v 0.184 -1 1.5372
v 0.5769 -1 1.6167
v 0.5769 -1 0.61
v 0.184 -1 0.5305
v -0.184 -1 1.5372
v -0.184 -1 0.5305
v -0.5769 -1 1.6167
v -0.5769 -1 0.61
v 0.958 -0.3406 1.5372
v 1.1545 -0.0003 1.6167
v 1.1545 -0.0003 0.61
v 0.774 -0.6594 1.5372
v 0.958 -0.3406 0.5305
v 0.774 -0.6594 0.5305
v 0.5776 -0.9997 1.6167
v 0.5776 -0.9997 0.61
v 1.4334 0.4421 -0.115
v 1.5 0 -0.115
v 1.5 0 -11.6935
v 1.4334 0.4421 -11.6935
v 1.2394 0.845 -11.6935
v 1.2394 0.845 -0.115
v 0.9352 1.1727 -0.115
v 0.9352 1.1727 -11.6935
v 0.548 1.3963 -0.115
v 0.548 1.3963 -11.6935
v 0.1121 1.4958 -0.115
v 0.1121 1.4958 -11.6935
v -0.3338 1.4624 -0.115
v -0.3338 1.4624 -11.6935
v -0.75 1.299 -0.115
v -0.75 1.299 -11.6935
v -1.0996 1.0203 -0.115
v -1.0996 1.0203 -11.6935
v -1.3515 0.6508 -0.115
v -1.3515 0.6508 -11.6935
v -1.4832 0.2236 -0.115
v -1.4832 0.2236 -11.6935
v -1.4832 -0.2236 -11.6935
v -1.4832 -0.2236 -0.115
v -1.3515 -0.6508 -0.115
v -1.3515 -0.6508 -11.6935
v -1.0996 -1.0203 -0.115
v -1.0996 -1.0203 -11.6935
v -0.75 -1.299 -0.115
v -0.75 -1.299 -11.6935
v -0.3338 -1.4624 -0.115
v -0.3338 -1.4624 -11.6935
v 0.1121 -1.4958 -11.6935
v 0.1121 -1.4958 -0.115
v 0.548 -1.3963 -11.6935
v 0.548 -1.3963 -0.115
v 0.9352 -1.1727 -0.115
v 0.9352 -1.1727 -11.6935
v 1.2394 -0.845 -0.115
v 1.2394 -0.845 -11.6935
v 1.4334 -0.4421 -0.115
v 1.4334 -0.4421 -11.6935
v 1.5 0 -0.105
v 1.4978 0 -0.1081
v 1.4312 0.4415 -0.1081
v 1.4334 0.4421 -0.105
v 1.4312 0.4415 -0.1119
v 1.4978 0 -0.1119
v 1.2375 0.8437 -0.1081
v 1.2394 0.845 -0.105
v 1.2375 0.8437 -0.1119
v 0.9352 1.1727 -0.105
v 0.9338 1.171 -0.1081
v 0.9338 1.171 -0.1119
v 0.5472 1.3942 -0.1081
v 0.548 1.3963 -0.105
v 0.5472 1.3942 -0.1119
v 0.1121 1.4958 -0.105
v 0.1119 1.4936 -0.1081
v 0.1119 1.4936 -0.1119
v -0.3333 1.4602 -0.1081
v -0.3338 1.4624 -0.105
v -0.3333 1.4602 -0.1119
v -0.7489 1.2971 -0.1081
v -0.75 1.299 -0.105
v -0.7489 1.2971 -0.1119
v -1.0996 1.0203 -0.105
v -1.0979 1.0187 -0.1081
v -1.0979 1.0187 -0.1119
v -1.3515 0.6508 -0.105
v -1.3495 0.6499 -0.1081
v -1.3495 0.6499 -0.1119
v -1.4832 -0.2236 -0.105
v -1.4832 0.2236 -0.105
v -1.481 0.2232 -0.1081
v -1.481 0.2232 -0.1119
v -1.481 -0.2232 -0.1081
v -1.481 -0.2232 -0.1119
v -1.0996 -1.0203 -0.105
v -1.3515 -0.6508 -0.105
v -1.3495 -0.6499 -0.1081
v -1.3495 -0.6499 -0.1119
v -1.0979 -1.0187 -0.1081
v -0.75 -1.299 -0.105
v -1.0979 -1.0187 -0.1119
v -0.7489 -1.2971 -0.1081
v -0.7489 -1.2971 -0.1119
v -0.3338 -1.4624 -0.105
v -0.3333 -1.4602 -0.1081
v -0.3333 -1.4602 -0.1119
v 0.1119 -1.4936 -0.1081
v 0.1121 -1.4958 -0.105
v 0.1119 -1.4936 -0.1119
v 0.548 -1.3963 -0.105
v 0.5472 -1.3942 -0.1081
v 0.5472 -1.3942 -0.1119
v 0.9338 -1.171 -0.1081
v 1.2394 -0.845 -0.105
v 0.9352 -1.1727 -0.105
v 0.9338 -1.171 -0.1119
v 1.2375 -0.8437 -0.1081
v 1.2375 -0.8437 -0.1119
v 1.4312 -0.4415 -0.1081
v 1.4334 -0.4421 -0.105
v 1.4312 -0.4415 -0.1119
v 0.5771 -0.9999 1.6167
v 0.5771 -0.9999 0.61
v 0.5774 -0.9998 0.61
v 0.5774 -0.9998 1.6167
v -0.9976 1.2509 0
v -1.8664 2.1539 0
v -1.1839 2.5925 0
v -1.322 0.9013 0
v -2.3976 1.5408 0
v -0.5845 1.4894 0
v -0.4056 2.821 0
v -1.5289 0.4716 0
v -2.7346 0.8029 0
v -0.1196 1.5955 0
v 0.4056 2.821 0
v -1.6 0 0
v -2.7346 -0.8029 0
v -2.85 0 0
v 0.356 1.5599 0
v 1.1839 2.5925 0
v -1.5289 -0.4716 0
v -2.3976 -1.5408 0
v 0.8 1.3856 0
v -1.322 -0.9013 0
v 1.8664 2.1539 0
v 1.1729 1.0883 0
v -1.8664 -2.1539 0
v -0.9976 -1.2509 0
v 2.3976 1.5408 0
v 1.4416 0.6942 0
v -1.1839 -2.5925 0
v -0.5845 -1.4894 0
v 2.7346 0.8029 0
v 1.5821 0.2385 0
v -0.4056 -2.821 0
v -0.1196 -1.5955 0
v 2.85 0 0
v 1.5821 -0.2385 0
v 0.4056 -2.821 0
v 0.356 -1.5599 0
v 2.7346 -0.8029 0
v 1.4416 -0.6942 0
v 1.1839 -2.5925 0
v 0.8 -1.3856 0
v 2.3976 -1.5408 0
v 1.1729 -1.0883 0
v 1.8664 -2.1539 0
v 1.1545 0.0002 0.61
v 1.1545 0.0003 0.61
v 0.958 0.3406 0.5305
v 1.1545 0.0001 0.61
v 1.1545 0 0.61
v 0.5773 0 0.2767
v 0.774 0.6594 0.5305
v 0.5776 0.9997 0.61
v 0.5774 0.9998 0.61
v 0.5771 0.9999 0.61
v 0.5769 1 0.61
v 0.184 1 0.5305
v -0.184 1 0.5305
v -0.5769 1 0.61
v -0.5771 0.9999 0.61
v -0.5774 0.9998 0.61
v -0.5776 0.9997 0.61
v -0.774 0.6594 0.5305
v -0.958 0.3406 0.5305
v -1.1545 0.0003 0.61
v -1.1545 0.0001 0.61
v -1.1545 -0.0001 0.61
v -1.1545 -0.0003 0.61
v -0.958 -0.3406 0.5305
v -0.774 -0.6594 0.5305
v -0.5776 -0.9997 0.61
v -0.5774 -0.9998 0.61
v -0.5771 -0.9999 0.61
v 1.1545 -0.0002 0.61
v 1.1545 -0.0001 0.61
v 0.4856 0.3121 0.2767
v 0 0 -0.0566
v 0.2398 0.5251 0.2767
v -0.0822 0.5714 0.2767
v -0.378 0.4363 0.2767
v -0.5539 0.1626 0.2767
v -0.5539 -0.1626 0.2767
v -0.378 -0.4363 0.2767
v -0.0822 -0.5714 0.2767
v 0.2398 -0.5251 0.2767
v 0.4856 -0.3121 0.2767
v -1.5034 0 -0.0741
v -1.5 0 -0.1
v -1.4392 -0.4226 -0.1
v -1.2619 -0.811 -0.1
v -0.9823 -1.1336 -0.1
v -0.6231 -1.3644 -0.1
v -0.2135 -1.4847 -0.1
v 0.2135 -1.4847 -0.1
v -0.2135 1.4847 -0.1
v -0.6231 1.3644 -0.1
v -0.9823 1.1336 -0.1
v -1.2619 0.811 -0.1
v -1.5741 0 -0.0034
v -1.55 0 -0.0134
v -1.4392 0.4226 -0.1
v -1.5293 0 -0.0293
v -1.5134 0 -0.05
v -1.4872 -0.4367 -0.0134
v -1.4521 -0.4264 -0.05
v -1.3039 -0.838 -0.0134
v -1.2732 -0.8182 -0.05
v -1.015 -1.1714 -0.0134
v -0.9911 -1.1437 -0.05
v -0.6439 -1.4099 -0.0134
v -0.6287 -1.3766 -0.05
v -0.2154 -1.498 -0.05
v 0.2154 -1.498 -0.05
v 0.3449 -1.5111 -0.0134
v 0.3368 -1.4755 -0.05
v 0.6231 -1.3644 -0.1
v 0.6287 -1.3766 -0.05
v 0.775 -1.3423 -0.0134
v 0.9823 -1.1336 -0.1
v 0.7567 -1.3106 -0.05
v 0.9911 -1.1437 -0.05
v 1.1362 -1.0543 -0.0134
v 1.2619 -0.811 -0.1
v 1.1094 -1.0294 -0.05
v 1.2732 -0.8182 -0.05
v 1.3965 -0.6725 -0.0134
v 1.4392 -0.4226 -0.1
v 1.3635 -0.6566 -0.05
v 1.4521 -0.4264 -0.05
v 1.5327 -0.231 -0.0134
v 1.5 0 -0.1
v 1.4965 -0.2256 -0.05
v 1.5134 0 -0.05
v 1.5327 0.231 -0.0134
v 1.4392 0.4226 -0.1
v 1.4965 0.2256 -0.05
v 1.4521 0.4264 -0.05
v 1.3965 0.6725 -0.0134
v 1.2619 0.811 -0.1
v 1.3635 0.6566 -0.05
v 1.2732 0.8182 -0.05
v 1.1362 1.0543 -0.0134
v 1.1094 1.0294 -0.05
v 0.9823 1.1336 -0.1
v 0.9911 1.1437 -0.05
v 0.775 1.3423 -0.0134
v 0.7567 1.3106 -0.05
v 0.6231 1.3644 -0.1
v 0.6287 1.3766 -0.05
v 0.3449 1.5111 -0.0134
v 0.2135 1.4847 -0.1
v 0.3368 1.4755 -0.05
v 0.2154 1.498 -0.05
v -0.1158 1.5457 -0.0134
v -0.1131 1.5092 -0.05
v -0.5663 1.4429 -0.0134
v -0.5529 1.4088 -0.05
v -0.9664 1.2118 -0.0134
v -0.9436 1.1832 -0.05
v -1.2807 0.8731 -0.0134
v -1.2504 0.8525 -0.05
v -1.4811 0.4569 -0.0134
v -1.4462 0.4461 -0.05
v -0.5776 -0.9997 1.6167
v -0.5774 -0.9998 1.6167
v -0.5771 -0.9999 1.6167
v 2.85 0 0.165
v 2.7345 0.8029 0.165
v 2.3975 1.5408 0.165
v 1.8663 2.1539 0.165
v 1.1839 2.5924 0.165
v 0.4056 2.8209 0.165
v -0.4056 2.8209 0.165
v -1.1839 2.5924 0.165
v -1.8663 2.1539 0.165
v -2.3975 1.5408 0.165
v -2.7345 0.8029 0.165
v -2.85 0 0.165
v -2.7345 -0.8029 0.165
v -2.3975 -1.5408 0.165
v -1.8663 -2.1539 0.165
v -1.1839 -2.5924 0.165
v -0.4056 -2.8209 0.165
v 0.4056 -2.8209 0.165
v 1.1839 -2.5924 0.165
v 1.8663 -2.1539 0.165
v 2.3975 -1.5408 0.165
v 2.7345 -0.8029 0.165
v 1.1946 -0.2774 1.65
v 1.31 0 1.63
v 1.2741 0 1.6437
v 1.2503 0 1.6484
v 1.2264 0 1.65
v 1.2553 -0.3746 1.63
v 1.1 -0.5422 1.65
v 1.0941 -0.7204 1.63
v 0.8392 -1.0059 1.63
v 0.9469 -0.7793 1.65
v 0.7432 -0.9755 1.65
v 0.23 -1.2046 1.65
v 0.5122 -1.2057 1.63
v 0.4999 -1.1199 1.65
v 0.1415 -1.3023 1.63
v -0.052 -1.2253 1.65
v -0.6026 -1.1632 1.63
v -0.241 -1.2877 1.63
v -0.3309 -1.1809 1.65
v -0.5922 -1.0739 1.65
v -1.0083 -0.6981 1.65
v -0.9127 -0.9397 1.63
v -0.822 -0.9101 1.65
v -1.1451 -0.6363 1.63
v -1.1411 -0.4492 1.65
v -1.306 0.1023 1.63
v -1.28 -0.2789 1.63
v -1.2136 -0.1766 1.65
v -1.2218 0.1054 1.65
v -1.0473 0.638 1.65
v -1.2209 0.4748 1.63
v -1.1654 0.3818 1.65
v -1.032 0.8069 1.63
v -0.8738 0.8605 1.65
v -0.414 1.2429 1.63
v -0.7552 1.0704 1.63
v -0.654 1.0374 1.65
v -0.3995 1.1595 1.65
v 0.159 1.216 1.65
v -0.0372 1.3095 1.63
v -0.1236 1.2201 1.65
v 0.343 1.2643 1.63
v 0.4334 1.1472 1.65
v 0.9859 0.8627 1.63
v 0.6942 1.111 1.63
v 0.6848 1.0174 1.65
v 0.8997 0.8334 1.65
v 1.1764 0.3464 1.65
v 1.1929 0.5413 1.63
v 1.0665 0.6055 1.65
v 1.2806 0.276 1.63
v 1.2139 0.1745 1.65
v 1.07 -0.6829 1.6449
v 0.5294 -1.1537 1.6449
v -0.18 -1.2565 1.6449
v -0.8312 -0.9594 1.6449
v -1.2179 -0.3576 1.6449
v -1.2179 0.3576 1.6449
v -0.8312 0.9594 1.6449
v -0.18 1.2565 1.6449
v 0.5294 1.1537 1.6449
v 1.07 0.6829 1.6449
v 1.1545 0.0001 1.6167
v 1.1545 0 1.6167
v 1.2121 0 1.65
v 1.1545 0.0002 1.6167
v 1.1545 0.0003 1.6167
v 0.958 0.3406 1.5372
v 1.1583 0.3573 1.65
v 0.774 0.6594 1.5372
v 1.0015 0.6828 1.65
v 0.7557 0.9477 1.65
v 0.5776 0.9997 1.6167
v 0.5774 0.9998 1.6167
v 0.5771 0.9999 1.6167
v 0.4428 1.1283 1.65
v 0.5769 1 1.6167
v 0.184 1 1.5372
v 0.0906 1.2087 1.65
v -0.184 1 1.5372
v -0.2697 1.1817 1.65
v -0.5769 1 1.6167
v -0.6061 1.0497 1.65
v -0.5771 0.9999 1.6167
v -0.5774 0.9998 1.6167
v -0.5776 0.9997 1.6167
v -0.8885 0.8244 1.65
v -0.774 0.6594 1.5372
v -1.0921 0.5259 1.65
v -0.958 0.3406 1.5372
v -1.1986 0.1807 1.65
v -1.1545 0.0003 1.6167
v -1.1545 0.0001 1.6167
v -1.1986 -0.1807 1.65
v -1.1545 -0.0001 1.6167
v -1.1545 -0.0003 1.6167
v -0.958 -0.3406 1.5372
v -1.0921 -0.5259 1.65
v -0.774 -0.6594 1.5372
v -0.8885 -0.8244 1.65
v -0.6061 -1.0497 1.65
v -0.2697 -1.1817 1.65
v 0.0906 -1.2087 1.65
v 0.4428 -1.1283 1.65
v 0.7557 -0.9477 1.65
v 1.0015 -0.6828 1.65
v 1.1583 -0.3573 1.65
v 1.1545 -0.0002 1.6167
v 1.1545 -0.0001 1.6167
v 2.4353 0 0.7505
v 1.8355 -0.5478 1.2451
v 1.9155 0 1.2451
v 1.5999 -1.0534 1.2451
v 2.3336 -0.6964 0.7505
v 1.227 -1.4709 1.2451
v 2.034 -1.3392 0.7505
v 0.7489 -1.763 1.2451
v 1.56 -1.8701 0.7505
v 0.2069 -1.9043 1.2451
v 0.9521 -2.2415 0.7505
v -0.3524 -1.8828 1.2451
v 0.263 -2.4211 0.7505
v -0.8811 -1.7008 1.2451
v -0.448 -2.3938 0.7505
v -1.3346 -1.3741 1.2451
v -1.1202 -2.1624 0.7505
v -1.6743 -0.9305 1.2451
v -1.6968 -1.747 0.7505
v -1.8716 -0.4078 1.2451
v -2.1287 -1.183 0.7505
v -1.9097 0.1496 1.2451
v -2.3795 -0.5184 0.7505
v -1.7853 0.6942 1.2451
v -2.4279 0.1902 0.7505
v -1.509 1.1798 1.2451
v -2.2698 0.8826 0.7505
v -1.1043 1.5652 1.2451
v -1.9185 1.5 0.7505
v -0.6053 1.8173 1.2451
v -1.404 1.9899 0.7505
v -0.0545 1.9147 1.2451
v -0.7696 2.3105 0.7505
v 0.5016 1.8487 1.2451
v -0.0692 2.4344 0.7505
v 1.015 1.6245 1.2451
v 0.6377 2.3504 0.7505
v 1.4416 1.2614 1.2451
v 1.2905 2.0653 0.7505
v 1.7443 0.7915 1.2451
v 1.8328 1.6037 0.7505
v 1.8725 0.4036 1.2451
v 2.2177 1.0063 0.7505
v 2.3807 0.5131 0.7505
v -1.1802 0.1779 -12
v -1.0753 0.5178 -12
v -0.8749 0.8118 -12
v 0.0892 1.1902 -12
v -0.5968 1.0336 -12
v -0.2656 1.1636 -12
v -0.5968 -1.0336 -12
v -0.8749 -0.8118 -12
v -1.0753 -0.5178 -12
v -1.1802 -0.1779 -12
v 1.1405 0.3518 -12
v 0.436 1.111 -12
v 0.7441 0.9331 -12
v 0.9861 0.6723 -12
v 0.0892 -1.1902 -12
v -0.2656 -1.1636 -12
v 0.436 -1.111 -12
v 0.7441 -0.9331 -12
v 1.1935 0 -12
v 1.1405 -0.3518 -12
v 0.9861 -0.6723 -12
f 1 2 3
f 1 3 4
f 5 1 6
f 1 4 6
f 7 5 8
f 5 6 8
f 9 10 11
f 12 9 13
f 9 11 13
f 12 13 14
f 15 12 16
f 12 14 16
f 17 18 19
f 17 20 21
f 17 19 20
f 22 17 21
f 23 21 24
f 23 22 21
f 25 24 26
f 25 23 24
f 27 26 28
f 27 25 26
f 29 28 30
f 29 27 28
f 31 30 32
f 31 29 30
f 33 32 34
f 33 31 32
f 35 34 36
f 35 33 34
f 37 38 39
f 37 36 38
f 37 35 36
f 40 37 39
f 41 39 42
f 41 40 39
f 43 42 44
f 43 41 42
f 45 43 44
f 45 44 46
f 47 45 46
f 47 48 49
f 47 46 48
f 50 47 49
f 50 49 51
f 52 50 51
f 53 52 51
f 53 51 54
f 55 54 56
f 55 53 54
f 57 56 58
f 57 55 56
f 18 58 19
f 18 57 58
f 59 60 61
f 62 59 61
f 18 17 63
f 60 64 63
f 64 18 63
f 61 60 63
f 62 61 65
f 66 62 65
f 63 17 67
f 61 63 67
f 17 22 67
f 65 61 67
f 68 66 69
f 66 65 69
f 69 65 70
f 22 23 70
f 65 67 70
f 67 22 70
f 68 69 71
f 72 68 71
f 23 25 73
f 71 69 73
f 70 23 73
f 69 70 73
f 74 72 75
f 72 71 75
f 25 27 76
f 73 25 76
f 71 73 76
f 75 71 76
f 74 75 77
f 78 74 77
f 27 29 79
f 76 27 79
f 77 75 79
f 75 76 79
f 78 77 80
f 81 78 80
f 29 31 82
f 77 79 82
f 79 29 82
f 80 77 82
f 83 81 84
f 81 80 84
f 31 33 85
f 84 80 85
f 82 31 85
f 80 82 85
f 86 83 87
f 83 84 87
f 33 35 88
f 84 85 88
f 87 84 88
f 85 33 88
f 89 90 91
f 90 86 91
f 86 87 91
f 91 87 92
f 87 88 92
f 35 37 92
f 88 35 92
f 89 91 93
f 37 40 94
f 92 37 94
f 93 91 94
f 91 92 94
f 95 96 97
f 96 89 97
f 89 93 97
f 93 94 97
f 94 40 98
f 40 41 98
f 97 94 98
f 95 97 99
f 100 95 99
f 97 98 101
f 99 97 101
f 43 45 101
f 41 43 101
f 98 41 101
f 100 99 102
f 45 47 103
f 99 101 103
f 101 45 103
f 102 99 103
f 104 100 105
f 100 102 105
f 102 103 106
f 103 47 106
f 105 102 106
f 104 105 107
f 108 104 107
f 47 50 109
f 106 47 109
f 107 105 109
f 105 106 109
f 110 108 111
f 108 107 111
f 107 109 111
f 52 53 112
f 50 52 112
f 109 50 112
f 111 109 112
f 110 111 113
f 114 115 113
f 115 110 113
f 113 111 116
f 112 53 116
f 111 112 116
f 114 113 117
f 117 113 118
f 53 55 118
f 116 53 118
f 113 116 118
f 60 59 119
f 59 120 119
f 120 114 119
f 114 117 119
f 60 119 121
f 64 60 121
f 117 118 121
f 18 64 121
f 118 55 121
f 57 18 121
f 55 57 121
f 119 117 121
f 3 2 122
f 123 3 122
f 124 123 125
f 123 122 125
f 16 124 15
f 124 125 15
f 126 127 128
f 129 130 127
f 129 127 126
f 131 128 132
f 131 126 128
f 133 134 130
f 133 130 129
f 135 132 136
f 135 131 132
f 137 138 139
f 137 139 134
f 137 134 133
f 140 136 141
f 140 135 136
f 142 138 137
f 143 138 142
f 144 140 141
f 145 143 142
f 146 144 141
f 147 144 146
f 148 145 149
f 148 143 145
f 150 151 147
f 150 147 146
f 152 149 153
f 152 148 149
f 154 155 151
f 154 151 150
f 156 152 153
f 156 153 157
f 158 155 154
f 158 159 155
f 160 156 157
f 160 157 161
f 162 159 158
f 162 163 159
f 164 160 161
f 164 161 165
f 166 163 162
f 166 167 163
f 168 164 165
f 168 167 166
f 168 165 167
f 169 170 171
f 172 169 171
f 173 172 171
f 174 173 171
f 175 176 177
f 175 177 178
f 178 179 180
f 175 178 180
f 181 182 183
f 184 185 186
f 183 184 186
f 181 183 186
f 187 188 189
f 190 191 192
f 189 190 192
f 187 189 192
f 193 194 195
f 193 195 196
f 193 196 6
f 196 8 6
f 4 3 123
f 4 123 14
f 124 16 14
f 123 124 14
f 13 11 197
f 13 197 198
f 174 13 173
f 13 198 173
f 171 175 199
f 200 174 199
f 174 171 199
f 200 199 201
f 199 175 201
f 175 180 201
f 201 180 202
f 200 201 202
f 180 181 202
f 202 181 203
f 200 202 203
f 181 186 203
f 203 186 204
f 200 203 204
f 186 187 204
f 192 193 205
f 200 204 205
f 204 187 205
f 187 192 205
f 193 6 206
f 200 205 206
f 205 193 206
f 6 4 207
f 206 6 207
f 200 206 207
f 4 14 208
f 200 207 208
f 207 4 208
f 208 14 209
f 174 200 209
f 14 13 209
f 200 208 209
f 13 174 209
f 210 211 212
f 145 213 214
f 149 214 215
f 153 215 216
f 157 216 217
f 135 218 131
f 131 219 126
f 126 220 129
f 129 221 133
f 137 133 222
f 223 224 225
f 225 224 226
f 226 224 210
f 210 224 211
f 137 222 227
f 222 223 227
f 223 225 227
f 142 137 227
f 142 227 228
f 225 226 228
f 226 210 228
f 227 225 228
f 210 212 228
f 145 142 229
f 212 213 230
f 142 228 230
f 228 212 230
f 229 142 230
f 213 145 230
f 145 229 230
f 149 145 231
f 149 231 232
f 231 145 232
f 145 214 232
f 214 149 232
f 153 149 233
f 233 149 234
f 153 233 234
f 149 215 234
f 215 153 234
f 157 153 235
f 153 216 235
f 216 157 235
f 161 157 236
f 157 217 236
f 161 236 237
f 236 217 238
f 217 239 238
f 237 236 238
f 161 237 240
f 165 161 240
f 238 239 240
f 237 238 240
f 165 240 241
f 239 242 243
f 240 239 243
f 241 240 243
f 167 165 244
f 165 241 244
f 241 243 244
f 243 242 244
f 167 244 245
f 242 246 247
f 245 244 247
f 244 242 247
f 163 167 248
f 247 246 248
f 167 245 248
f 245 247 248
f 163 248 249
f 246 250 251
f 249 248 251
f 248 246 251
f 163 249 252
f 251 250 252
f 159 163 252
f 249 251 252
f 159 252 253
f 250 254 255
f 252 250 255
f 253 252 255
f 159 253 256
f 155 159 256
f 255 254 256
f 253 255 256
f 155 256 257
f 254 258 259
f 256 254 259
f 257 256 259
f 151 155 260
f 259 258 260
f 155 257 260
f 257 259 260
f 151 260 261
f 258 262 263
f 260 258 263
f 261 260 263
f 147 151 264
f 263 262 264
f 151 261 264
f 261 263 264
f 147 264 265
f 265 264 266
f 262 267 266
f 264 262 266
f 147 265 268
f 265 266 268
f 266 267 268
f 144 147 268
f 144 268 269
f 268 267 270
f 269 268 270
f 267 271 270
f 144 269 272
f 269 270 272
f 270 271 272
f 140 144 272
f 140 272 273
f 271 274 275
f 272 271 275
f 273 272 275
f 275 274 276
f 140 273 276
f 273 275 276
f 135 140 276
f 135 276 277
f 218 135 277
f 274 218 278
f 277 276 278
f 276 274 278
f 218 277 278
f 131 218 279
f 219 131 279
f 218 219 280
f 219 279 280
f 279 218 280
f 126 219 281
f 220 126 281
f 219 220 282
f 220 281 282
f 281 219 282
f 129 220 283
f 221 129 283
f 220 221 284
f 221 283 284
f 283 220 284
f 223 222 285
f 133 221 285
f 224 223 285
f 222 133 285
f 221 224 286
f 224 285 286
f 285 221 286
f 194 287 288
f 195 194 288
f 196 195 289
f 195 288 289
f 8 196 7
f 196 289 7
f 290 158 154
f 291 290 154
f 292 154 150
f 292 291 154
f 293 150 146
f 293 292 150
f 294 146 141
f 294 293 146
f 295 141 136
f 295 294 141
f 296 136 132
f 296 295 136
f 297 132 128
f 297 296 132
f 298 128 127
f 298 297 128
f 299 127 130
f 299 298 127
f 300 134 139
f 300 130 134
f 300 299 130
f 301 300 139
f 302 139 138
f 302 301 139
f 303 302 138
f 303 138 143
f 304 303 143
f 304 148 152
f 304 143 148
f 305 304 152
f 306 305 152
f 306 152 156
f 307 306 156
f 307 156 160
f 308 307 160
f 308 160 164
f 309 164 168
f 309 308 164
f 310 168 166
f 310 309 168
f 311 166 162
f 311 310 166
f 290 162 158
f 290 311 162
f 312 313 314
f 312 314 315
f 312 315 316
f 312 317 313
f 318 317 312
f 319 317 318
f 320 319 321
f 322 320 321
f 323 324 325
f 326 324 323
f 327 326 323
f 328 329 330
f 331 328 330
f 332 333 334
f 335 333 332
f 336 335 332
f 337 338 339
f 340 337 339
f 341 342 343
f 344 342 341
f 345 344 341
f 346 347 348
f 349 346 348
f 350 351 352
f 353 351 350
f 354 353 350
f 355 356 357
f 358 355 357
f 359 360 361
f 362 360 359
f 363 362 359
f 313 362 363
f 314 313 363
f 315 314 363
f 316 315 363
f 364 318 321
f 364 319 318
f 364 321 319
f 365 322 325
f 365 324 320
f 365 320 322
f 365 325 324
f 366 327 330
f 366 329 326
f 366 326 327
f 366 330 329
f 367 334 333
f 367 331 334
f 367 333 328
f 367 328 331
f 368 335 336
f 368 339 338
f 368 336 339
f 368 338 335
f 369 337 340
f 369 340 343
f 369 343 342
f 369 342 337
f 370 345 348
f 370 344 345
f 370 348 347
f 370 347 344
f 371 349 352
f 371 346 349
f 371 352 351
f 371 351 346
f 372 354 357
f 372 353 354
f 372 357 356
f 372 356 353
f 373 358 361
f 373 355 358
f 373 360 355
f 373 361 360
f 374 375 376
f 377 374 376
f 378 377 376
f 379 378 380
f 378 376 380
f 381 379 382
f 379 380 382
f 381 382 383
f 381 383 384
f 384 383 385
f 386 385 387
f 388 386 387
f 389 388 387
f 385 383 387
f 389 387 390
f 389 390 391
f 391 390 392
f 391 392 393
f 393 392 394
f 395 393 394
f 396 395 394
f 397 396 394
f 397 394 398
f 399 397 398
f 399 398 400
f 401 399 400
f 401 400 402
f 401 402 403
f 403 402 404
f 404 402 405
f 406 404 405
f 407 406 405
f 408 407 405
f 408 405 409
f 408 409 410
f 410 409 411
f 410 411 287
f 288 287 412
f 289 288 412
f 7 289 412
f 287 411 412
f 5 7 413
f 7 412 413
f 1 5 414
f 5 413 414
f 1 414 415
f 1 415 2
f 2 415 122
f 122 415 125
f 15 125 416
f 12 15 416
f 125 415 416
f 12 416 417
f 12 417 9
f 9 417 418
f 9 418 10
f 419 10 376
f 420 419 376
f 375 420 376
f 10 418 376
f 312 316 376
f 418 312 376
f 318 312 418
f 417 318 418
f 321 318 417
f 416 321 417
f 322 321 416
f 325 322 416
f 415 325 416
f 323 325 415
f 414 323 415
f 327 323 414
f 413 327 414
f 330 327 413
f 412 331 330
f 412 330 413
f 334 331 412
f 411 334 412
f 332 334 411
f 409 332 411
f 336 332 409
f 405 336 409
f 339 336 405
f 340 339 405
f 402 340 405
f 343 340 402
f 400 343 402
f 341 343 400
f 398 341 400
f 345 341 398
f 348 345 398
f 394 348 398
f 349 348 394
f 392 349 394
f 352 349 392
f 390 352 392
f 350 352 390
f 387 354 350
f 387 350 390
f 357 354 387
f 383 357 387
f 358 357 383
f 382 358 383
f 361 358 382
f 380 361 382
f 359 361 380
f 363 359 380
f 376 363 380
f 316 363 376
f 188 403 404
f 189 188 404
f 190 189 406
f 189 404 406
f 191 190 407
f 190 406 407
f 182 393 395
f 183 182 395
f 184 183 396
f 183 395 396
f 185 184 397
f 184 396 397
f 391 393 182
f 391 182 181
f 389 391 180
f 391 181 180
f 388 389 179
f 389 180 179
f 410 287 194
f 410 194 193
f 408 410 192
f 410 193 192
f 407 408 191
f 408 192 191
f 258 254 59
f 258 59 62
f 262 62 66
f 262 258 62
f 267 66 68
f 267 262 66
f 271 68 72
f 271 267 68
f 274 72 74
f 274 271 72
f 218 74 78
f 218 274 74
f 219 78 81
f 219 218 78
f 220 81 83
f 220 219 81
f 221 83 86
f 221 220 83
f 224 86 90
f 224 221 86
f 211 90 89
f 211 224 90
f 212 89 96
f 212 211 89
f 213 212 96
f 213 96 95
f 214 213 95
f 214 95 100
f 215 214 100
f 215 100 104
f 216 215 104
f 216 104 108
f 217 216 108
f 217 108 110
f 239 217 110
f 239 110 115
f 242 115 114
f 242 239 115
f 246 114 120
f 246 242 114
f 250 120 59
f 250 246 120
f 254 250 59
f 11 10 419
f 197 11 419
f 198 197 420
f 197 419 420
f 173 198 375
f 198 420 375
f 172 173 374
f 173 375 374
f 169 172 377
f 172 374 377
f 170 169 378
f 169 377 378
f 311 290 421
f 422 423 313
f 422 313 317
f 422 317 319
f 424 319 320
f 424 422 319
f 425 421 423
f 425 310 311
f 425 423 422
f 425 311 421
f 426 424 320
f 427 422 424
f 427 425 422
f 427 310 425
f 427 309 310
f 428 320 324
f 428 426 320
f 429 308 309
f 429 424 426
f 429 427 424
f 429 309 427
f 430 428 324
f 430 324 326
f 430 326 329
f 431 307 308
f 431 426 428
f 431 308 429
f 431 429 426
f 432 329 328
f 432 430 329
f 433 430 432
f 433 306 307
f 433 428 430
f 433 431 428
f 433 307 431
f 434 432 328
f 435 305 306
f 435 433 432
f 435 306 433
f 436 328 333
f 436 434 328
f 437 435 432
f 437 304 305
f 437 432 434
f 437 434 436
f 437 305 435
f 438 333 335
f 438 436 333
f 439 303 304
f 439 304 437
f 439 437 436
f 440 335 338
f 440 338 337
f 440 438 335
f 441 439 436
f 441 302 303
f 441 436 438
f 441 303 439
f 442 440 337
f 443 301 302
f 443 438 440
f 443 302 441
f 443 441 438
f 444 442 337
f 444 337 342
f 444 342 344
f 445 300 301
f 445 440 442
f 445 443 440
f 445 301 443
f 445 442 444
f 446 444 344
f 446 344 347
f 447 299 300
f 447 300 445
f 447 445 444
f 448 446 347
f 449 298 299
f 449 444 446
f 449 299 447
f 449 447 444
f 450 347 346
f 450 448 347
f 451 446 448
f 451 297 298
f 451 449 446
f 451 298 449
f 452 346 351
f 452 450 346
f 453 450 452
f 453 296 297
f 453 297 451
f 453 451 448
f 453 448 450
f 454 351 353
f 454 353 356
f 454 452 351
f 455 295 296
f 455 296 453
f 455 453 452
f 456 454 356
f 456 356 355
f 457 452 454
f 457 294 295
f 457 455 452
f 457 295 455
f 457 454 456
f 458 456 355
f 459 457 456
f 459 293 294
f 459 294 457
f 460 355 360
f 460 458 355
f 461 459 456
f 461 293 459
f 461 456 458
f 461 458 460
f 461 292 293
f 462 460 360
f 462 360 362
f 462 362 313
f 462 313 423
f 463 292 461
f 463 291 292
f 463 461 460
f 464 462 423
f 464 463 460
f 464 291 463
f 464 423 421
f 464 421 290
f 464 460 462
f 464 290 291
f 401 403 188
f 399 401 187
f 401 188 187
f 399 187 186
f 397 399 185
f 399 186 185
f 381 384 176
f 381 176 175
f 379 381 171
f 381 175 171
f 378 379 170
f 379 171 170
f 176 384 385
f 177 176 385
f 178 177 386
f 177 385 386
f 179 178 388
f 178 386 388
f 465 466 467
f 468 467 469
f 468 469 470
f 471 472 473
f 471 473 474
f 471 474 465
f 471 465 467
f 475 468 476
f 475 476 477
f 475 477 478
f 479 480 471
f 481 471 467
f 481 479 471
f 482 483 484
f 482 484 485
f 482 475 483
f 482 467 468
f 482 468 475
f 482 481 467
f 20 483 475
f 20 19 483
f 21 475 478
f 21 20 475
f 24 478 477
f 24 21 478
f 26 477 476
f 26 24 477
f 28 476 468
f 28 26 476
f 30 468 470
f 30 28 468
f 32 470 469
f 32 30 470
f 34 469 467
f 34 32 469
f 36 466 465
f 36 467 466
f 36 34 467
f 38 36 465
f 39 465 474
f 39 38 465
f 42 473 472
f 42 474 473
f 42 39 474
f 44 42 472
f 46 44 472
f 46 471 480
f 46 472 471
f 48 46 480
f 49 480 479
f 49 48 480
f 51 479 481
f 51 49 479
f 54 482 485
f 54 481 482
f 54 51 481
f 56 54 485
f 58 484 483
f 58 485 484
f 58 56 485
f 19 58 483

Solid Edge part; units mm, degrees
sketch "Sketch1" plane through (0, 0, 0) normal (0, -1, 0) x (1, 0, 0)
  line L0 (0, -12) -> (1.5, -12)
  line L1 (1.5, -12) -> (1.5, -0.115)
  arc A0 (1.5, -0.105) -> (1.5, -0.115) centre (1.5037, -0.11) ccw
  line L2 (1.5, -0.105) -> (1.5, 0)
  line L3 (1.5, 0) -> (2.85, 0)
  line L4 (2.85, 0) -> (2.85, 0.165)
  arc A1 (1.27, 1.65) -> (2.85, 0.165) centre (-0.3628, -1.6703) cw
  line L5 (0, 1.65) -> (1.27, 1.65)
  dimension "D1" = 11.885
  dimension "D2" = 1.5
  dimension "D3" = 1.27
  dimension "D4" = 2.85
  dimension "D5" = 0.165
  dimension "D6" = 1.65
  dimension "D7" = 3.7
  dimension "D8" = 12
  dimension "D9" = 0.01
  dimension "D10" = 0.0025
revolve "RevolvedProtrusion1" add sketch "Sketch1" angle 360 about axis through (0, 0, 5) along (0, 0, -1)
sketch "Sketch2" plane through (0, 0, 0) normal (0, -1, 0) x (1, 0, 0)
  line L0 (0, -0.0566) -> (1.1545, 0.61)
  line L1 (1.1545, 0.61) -> (1.1545, 1.65)
  line L2 (1.1545, 1.65) -> (0, 1.65)
  dimension "D1" = 1.1545
  dimension "D2" = 1.04
revolve "RevolvedCutout1" cut sketch "Sketch2" angle 360 about axis through (0, 0, 5.3) along (0, 0, -1)
sketch "Sketch3" plane through (0, 0, 0) normal (0, 0, -1) x (0, 1, 0)
  arc A0 (-1, 0.577) -> (-1, -0.577) centre (0, 0) ccw
  line L0 (-1, 0.577) -> (-1, -0.577)
  dimension "D1" = 1
extrude "Protrusion1" add sketch "Sketch3" against normal blind 1.65
pattern_circular "Pattern1" count 6 over 360 about axis through (0, 0, 0) along (0, 0, -1) of "Protrusion1"
fillet "Round_1" radius 0.185 1 edges at (-1.27, 0, 1.65)
sketch "Sketch4" plane through (0, 0, 0) normal (0, -1, 0) x (1, 0, 0)
  line L0 (0, 0.9501) -> (1.2122, 1.65)
  line L1 (1.2122, 1.65) -> (0, 1.65)
  dimension "D1" = 1.2122
revolve "RevolvedCutout2" cut sketch "Sketch4" angle 360 about axis through (0, 0, 5.3) along (0, 0, -1)
sketch "Sketch5" plane through (0, 0, 0) normal (0, -1, 0) x (1, 0, 0)
  line L0 (-1.5, 0) -> (-1.5, -0.1)
  line L1 (-1.6, 0) -> (-1.5, 0)
  arc A0 (-1.6, 0) -> (-1.5, -0.1) centre (-1.6, -0.1) cw
  dimension "D1" = 1.5
  dimension "D2" = 0.1
revolve "RevolvedProtrusion2" add sketch "Sketch5" angle 360 about axis through (0, 0, -0.5) along (0, 0, 1)
cosmetic_thread "Thread1" size "M3"
chamfer "Chamfer1" distance 0.3065 angle 45 1 edges at (-1.5, 0, -12)
properties material "Stahl"
